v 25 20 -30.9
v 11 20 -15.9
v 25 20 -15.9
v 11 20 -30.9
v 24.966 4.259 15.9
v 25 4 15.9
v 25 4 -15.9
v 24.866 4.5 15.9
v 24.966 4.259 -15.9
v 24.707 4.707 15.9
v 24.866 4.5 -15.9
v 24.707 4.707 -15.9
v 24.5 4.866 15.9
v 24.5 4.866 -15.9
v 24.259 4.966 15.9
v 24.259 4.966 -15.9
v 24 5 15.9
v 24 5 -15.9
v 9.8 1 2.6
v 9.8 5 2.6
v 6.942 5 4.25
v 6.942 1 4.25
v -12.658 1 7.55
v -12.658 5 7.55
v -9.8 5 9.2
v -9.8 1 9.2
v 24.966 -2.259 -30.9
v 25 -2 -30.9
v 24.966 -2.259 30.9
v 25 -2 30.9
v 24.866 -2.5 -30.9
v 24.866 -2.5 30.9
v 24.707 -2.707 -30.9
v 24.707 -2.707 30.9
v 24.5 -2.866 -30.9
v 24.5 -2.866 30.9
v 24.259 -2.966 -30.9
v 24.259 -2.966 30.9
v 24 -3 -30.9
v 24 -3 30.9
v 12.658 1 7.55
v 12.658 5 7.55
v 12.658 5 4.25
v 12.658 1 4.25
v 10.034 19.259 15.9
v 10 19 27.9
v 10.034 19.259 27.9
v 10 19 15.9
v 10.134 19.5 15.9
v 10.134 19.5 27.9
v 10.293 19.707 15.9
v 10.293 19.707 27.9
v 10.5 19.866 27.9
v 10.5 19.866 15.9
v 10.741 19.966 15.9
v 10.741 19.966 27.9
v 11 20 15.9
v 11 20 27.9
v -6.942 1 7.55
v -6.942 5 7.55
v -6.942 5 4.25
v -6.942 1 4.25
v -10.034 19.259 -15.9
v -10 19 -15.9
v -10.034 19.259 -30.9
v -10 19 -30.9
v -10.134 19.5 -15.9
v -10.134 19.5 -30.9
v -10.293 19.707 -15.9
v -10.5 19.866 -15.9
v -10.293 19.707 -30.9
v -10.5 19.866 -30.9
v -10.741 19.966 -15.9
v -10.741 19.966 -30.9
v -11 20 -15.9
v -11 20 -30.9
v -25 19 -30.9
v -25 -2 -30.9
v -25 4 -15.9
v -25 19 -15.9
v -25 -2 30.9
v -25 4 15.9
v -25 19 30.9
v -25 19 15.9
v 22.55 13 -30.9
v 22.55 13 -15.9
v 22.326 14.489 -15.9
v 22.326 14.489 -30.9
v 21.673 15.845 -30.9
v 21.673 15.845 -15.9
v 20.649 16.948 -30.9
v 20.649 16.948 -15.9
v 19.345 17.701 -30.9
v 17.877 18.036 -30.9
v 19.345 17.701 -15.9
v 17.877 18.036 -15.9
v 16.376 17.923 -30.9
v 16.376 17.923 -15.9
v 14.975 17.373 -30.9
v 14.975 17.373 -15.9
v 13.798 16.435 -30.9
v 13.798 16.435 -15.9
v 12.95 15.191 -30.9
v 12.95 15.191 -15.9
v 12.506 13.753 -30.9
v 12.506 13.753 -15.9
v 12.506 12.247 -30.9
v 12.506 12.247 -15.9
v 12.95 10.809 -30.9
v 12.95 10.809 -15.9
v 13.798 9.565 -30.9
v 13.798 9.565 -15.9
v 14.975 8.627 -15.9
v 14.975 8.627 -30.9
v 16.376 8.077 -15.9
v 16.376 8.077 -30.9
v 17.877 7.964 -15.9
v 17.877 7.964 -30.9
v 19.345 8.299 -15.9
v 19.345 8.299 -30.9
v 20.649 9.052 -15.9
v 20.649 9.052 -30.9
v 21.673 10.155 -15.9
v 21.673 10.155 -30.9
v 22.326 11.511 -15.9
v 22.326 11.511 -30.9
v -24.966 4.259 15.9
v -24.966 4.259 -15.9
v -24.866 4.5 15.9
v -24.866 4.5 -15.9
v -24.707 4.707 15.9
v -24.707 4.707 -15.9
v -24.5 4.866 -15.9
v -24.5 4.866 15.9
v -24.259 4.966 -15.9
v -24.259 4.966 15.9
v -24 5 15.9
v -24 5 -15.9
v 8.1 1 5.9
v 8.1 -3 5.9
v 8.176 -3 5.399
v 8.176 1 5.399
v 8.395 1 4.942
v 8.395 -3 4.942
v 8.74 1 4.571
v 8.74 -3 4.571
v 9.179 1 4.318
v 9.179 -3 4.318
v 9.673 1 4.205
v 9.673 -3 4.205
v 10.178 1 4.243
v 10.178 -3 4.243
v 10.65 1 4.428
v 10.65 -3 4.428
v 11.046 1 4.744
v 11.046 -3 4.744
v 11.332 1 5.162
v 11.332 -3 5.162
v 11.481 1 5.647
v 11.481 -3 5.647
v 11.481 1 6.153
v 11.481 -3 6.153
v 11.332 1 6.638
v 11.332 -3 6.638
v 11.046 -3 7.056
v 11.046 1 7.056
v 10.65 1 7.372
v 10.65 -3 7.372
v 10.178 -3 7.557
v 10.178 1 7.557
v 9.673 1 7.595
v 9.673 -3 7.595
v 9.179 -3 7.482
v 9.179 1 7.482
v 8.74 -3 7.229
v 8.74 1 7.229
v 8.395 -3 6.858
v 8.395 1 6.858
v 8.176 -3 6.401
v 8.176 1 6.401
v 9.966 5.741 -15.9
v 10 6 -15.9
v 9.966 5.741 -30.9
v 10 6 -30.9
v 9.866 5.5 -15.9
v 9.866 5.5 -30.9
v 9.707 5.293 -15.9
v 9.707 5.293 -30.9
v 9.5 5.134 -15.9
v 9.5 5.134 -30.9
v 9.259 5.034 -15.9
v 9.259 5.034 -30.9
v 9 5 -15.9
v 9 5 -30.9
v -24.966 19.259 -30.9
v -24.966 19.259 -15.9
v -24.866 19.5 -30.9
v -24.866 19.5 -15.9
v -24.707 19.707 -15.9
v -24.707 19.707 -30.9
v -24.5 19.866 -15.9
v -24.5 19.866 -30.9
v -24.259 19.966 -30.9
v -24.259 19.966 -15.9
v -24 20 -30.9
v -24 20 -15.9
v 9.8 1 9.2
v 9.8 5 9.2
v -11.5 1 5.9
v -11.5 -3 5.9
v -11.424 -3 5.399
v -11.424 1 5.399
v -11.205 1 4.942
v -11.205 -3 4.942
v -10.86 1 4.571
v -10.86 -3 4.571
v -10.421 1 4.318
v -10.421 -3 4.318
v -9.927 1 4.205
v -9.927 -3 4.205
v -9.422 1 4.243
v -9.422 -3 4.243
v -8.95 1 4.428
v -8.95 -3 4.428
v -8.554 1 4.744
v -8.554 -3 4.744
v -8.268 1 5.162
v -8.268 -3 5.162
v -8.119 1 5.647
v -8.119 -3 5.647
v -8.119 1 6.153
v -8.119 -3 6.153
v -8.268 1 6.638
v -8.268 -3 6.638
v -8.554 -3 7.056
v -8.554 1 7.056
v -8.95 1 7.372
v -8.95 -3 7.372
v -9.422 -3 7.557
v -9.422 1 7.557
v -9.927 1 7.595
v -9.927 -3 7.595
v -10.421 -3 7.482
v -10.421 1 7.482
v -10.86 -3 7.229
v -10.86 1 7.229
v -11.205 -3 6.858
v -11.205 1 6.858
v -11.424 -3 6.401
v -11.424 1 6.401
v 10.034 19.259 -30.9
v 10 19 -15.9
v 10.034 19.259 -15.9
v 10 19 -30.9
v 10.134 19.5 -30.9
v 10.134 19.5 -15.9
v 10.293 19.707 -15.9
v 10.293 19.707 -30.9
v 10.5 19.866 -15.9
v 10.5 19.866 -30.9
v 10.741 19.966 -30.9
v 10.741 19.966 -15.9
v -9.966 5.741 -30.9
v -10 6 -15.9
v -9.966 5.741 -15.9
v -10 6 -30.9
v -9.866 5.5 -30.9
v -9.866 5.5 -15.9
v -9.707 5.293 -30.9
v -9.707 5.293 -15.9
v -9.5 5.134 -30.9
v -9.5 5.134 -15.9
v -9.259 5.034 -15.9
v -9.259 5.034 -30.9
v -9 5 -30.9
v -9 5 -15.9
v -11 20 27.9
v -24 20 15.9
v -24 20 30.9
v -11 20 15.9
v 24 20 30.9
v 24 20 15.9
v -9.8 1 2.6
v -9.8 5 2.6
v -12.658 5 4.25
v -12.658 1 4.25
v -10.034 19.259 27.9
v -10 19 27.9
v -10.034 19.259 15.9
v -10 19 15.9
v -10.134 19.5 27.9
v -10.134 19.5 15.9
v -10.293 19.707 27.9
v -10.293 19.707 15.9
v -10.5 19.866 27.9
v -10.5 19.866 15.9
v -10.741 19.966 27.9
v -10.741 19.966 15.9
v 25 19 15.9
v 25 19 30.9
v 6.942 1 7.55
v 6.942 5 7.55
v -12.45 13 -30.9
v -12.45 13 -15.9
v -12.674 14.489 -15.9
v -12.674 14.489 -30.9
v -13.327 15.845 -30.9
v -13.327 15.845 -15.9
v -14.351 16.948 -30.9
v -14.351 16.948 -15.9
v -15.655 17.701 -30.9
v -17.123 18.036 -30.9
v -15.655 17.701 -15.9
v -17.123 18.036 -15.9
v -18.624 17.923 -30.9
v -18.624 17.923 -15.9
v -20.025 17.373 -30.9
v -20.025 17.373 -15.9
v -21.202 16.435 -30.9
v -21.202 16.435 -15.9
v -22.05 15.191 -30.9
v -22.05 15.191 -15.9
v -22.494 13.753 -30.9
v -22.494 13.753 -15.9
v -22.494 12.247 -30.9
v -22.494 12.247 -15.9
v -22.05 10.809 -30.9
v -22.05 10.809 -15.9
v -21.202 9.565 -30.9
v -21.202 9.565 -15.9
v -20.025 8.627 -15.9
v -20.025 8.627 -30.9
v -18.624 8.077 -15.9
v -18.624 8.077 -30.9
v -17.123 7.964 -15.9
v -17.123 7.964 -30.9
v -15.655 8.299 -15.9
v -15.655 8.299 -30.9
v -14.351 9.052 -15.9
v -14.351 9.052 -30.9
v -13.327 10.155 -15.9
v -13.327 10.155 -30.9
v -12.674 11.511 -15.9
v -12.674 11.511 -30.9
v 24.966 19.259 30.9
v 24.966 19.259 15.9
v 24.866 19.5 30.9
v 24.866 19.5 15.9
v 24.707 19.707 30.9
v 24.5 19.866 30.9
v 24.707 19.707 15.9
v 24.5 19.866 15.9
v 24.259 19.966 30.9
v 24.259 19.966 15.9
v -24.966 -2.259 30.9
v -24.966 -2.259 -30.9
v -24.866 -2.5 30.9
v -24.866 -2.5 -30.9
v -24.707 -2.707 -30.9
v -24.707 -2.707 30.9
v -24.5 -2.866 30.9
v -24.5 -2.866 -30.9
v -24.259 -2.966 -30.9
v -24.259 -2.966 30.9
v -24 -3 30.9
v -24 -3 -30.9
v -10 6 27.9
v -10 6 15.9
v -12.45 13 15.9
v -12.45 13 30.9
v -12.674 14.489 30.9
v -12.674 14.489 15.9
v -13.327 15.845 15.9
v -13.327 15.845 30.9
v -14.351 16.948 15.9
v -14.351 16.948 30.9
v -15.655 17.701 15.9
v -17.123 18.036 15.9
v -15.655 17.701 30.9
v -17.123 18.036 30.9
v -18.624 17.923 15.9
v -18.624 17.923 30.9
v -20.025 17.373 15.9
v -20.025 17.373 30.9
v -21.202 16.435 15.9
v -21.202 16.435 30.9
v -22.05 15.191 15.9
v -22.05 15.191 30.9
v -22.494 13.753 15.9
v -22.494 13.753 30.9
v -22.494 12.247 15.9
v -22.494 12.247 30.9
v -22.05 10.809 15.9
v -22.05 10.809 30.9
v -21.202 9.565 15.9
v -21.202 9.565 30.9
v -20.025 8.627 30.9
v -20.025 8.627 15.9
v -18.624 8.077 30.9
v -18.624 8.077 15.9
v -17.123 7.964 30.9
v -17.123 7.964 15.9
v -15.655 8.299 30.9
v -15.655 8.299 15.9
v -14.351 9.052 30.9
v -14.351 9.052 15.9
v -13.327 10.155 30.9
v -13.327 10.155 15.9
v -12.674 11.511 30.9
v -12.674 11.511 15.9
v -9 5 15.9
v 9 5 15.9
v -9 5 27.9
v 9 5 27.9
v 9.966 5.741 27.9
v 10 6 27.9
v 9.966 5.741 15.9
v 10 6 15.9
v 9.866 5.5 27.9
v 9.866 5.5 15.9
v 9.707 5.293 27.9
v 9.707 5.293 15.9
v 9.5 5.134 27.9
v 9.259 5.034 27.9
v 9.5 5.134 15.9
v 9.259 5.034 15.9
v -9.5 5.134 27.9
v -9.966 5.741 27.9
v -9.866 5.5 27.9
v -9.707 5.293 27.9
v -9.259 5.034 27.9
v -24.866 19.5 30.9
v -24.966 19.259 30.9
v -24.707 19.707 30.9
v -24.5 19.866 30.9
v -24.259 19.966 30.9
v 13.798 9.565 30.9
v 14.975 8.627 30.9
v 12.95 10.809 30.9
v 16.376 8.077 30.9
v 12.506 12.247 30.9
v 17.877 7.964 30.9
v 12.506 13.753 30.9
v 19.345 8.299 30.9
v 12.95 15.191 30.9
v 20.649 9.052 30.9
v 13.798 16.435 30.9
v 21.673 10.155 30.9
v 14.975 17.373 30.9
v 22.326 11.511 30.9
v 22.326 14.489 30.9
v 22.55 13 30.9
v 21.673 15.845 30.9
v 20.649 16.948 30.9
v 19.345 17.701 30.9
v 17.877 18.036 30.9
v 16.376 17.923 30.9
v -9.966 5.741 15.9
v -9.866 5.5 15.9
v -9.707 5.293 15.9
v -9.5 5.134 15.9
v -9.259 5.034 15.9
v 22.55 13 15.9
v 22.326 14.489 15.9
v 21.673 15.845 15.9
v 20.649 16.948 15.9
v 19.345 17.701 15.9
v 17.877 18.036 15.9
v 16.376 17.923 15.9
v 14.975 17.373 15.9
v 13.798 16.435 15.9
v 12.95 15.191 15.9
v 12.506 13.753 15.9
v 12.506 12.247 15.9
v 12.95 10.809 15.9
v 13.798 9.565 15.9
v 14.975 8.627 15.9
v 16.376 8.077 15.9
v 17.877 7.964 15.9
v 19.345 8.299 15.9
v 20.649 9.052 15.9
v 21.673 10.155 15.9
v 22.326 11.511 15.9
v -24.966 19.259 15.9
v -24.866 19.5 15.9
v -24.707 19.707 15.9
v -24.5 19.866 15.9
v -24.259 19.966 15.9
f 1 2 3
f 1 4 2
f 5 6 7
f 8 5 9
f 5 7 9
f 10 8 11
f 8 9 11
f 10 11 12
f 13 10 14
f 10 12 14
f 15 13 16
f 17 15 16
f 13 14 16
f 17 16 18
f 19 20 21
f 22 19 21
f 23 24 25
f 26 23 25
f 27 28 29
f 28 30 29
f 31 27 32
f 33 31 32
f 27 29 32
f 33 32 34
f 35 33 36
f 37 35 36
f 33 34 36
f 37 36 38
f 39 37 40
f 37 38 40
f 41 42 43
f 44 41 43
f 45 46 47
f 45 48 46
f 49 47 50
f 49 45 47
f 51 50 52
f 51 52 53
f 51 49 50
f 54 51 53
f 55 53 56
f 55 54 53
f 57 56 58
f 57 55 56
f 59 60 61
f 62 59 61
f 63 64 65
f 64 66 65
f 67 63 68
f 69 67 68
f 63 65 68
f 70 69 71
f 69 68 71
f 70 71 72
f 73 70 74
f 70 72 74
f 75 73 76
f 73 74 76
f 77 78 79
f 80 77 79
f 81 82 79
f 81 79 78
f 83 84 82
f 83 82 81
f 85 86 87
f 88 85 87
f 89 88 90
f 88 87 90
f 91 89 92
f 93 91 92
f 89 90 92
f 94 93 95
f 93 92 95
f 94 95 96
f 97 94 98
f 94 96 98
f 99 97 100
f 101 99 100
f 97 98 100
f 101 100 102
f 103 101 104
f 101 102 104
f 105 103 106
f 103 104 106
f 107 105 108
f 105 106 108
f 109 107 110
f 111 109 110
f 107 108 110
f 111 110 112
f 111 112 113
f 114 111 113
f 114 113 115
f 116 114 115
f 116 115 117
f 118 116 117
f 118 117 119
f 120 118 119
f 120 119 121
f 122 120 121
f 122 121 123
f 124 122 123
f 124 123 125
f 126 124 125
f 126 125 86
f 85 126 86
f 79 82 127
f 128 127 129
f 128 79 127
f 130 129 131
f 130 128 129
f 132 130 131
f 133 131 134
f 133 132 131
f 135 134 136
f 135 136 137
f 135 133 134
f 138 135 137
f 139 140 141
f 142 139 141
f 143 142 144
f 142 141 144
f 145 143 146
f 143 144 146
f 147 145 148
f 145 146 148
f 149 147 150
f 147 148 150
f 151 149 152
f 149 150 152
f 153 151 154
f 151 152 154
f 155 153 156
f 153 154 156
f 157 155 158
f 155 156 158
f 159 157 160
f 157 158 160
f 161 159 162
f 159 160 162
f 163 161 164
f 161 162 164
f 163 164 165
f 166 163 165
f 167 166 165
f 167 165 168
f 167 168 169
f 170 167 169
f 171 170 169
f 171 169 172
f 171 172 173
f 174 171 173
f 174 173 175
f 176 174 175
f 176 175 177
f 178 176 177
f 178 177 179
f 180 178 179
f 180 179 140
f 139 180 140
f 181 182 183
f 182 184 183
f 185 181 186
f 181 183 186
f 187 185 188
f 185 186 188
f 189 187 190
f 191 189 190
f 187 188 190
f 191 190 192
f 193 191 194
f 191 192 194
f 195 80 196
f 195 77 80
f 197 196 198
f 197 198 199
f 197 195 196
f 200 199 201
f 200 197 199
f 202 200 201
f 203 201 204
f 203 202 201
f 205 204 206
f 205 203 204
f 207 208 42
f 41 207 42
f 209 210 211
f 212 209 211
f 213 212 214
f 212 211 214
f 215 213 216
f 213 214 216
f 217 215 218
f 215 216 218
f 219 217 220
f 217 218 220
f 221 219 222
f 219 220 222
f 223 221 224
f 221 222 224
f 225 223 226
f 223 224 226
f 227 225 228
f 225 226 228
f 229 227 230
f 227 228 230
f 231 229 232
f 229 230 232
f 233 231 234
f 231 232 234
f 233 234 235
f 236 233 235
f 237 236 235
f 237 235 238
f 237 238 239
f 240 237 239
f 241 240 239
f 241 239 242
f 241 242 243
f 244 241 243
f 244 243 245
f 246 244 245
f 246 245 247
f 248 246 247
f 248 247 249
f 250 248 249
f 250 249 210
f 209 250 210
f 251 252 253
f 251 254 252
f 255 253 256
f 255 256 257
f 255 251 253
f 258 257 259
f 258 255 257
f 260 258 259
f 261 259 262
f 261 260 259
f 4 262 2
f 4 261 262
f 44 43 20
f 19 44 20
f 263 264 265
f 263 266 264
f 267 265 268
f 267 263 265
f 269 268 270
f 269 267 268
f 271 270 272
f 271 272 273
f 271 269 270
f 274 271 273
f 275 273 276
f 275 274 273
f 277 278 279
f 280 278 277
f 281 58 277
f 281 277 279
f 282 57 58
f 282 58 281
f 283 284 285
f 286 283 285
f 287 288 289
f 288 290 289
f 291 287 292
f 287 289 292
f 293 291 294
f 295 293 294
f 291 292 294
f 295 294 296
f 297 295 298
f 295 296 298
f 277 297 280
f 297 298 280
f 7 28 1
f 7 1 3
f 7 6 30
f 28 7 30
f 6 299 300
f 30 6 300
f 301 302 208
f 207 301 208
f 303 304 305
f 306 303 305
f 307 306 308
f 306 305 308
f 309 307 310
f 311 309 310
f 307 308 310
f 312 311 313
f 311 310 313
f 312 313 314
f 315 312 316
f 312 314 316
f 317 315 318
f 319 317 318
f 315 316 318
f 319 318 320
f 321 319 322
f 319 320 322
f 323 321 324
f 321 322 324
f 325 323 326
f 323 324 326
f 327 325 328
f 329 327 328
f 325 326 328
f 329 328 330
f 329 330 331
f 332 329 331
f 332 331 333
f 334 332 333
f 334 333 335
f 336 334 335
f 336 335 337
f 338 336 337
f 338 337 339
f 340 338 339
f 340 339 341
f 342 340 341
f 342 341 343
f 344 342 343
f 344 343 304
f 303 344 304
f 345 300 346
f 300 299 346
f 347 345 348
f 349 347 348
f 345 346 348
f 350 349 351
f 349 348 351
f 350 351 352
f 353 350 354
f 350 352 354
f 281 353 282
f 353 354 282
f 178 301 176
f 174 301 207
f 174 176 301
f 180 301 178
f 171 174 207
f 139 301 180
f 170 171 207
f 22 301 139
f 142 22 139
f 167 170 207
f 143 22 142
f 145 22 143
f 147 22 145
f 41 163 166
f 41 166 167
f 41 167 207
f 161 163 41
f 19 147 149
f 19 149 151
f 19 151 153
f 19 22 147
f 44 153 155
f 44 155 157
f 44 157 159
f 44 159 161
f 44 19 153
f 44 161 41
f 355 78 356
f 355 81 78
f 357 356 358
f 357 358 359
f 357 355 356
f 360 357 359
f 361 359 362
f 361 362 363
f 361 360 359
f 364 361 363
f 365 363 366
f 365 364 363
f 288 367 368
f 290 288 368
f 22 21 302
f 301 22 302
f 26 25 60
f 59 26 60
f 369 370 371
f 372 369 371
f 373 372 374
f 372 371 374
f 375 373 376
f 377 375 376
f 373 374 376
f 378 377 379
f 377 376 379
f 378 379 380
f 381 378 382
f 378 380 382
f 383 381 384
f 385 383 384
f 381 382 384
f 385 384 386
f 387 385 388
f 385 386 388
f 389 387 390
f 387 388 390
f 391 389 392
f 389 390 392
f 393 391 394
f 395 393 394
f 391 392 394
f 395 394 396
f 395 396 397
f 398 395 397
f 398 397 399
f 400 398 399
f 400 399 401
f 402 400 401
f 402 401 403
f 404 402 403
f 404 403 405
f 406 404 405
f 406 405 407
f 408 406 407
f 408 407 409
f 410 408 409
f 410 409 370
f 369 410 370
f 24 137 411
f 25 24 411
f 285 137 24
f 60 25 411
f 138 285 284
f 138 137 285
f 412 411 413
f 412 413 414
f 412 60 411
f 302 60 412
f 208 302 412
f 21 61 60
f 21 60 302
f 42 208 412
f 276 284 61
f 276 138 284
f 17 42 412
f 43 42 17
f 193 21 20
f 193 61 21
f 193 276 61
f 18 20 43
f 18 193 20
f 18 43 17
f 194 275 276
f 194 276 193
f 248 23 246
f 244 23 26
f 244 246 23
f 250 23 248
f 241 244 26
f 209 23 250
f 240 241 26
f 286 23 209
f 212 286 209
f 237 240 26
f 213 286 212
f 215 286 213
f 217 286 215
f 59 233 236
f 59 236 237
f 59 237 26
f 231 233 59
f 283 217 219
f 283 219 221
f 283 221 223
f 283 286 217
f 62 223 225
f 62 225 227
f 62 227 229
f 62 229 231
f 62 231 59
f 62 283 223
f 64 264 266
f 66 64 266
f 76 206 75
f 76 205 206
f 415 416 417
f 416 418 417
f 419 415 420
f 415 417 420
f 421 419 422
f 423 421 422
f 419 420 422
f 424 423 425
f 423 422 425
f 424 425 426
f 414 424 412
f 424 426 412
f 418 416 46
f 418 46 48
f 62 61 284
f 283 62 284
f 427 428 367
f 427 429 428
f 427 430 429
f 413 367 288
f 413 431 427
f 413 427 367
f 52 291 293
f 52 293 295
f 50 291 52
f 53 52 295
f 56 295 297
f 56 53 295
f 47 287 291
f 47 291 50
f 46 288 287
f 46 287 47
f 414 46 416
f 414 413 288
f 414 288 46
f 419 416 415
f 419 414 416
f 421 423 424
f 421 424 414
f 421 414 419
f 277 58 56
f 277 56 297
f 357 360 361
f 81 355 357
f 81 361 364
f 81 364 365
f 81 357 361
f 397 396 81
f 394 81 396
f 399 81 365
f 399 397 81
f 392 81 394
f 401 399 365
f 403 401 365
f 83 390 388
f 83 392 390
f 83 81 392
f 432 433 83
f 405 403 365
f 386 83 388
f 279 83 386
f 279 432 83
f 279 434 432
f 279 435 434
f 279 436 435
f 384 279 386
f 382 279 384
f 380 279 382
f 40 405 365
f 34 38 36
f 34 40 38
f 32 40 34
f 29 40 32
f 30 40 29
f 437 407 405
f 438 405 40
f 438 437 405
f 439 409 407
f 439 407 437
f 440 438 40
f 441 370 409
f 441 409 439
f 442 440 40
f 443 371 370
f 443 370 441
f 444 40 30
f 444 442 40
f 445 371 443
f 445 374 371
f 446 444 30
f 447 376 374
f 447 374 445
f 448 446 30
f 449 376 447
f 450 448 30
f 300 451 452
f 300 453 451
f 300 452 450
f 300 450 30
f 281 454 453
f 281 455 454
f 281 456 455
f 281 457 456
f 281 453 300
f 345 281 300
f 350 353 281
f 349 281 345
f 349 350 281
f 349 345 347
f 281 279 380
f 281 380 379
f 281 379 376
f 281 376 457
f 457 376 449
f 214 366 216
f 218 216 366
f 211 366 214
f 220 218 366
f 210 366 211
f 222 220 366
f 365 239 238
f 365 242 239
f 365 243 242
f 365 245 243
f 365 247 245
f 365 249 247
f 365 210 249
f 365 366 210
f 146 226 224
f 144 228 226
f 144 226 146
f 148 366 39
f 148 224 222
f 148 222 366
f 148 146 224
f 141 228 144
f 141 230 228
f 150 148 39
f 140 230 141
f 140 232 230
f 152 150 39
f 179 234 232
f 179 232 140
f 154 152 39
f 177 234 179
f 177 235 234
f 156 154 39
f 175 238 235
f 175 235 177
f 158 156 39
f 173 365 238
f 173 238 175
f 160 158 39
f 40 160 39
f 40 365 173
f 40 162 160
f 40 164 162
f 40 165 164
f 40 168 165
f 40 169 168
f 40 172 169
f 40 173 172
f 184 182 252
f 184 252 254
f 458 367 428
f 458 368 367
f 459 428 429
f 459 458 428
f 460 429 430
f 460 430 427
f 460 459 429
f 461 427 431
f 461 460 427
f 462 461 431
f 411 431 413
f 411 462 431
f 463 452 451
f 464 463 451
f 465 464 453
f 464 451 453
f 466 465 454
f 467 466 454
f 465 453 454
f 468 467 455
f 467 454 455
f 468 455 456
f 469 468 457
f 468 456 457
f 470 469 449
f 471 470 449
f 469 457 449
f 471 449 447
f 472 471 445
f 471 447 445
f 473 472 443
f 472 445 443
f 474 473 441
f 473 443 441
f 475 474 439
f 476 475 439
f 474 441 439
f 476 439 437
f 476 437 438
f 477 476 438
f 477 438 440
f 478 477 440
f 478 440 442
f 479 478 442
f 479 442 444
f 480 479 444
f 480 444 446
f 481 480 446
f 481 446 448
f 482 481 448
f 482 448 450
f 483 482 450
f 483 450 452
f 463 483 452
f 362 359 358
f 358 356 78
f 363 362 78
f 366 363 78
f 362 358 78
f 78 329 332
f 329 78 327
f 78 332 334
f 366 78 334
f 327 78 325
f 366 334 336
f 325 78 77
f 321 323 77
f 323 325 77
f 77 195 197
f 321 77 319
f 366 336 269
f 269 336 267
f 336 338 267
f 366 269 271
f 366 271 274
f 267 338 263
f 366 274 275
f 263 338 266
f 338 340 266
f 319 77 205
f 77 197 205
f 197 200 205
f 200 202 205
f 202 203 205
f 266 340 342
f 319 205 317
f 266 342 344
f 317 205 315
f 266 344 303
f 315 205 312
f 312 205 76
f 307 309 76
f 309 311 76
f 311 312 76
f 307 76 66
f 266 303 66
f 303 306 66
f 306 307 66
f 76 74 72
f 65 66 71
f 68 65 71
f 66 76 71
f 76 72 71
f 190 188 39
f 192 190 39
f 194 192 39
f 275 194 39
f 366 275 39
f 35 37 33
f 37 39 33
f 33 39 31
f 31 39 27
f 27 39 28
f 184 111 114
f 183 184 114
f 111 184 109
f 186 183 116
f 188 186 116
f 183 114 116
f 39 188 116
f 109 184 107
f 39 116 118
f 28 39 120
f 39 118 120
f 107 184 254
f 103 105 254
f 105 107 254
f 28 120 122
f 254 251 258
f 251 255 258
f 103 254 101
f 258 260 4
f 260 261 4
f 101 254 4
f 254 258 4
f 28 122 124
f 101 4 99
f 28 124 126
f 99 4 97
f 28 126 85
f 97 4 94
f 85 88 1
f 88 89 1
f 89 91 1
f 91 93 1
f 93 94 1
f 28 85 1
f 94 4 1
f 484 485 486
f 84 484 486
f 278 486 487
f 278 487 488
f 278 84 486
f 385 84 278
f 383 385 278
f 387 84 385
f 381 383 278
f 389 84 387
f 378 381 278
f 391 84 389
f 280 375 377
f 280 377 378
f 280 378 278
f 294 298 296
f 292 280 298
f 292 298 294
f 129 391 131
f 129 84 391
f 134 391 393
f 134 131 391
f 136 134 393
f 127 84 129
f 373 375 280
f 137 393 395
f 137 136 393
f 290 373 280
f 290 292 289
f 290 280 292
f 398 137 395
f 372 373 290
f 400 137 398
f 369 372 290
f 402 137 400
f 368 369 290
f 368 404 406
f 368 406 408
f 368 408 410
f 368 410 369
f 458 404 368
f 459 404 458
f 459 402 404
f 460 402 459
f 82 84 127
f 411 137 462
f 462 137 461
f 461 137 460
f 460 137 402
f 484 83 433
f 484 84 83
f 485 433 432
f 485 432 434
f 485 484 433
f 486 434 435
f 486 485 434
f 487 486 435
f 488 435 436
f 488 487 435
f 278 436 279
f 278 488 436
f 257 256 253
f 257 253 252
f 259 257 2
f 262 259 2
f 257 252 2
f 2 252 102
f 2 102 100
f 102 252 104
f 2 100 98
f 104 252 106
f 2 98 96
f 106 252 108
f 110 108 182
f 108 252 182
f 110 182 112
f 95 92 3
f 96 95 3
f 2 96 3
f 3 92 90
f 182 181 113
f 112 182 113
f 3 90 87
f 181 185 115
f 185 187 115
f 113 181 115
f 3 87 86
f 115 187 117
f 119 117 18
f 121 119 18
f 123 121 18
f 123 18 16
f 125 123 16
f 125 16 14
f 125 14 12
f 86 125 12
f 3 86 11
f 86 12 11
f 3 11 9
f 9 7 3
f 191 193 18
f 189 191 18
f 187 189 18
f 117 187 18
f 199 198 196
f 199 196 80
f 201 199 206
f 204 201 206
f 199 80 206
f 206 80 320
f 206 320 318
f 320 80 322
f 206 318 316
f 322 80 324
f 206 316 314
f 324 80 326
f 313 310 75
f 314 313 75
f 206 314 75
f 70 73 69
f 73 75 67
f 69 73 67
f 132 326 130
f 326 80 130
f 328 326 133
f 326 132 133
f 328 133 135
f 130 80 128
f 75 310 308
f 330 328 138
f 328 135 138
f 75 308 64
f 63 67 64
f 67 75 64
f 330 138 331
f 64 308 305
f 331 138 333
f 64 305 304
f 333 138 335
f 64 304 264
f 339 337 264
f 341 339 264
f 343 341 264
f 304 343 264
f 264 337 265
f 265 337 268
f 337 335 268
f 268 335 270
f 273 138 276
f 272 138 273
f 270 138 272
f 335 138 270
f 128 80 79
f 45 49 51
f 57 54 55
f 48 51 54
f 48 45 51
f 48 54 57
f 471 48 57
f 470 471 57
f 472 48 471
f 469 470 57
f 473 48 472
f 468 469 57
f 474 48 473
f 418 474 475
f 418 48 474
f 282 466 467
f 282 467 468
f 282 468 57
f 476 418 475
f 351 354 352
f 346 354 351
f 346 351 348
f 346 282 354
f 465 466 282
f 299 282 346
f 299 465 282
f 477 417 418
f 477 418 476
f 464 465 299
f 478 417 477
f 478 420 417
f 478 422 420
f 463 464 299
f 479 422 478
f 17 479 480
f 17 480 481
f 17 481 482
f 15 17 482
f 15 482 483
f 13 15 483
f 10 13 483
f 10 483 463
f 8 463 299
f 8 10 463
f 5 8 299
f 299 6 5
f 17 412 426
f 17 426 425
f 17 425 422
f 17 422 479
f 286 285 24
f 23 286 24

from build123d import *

# Parameters (mm, degrees)
SKETCH1_W               = 50
SKETCH1_H               = 61.8
BOSS_EXTRUDE1_DEPTH     = 5
SKETCH2_W               = 15
SKETCH2_H               = 15
BOSS_EXTRUDE2_DEPTH     = 15
SKETCH3_R               = 5.05
CUT_EXTRUDE1_DEPTH      = 1
CUT_EXTRUDE1_DEPTH_BACK = 62.8
SKETCH4_W               = 20
SKETCH4_H               = 3
BOSS_EXTRUDE3_DEPTH     = 15
SKETCH6_W               = 50
SKETCH6_H               = 61.8
BOSS_EXTRUDE5_DEPTH     = 3
FILLET1_R               = 1
CUT_EXTRUDE2_DEPTH      = 4
M3_CLEARANCE_HOLE1_D    = 3.4


with BuildPart() as part:
    # Sketch1 → Boss-Extrude1 (new body)
    with BuildSketch(Plane(origin=(0, 0, 0), x_dir=(1, 0, 0), z_dir=(0, 1, 0))):
        Rectangle(SKETCH1_W, SKETCH1_H)
    extrude(amount=BOSS_EXTRUDE1_DEPTH)

    # Sketch2 → Boss-Extrude2 (add)
    with BuildSketch(Plane(origin=(0, 5, 0), x_dir=(1, 0, 0), z_dir=(0, 1, 0))):
        with Locations((-17.5, 23.4)):
            Rectangle(SKETCH2_W, SKETCH2_H)
        with Locations((17.5, 23.4)):
            Rectangle(SKETCH2_W, SKETCH2_H)
        with Locations((-17.5, -23.4)):
            Rectangle(SKETCH2_W, SKETCH2_H)
        with Locations((17.5, -23.4)):
            Rectangle(SKETCH2_W, SKETCH2_H)
    extrude(amount=BOSS_EXTRUDE2_DEPTH)

    # Sketch3 → Cut-Extrude1 (cut, two sides)
    with BuildSketch(Plane.XY.offset(30.9)) as cut_extrude1_sk:
        with Locations((-17.5, 13)):
            Circle(SKETCH3_R)
        with Locations((17.5, 13)):
            Circle(SKETCH3_R)
    extrude(amount=CUT_EXTRUDE1_DEPTH, mode=Mode.SUBTRACT)
    extrude(cut_extrude1_sk.sketch, amount=-CUT_EXTRUDE1_DEPTH_BACK, mode=Mode.SUBTRACT)

    # Sketch4 → Boss-Extrude3 (add)
    with BuildSketch(Plane(origin=(0, 5, 0), x_dir=(1, 0, 0), z_dir=(0, 1, 0))):
        with Locations((0, -29.4)):
            Rectangle(SKETCH4_W, SKETCH4_H)
    extrude(amount=BOSS_EXTRUDE3_DEPTH)

    # Sketch6 → Boss-Extrude5 (add)
    with BuildSketch(Plane.XZ):
        Rectangle(SKETCH6_W, SKETCH6_H)
    extrude(amount=BOSS_EXTRUDE5_DEPTH)

    # Fillet1
    fillet1_edges = [part.edges().sort_by_distance(p)[0] for p in [
        (-25, 5, 0),
        (-10, 5, -23.4),
        (-25, 20, -23.4),
        (-10, 20, -23.4),
        (10, 5, -23.4),
        (10, 20, -23.4),
        (-25, 20, 23.4),
        (25, 5, 0),
        (10, 5, 21.9),
        (25, 20, 23.4),
        (10, 20, 21.9),
        (-10, 20, 21.9),
        (-10, 5, 21.9),
        (-25, -3, 0),
        (25, -3, 0),
    ]]
    fillet(fillet1_edges, radius=FILLET1_R)

    # Sketch7 → Cut-Extrude2 (cut)
    with BuildSketch(Plane(origin=(0, 5, 0), x_dir=(1, 0, 0), z_dir=(0, 1, 0))):
        Polygon((-12.657883832, -4.25), (-12.657883832, -7.55), (-9.8, -9.2), (-6.942116168, -7.55), (-6.942116168, -4.25), (-9.8, -2.6), align=None)
        Polygon((12.657883832, -7.55), (12.657883832, -4.25), (9.8, -2.6), (6.942116168, -4.25), (6.942116168, -7.55), (9.8, -9.2), align=None)
    extrude(amount=-CUT_EXTRUDE2_DEPTH, mode=Mode.SUBTRACT)

    # M3 Clearance Hole1 (through all)
    with Locations(Plane(origin=(0, 5, 0), x_dir=(1, 0, 0), z_dir=(0, 1, 0))):
        with Locations((-9.8, -5.9), (9.8, -5.9)):
            Hole(M3_CLEARANCE_HOLE1_D / 2)


solid = part.part
